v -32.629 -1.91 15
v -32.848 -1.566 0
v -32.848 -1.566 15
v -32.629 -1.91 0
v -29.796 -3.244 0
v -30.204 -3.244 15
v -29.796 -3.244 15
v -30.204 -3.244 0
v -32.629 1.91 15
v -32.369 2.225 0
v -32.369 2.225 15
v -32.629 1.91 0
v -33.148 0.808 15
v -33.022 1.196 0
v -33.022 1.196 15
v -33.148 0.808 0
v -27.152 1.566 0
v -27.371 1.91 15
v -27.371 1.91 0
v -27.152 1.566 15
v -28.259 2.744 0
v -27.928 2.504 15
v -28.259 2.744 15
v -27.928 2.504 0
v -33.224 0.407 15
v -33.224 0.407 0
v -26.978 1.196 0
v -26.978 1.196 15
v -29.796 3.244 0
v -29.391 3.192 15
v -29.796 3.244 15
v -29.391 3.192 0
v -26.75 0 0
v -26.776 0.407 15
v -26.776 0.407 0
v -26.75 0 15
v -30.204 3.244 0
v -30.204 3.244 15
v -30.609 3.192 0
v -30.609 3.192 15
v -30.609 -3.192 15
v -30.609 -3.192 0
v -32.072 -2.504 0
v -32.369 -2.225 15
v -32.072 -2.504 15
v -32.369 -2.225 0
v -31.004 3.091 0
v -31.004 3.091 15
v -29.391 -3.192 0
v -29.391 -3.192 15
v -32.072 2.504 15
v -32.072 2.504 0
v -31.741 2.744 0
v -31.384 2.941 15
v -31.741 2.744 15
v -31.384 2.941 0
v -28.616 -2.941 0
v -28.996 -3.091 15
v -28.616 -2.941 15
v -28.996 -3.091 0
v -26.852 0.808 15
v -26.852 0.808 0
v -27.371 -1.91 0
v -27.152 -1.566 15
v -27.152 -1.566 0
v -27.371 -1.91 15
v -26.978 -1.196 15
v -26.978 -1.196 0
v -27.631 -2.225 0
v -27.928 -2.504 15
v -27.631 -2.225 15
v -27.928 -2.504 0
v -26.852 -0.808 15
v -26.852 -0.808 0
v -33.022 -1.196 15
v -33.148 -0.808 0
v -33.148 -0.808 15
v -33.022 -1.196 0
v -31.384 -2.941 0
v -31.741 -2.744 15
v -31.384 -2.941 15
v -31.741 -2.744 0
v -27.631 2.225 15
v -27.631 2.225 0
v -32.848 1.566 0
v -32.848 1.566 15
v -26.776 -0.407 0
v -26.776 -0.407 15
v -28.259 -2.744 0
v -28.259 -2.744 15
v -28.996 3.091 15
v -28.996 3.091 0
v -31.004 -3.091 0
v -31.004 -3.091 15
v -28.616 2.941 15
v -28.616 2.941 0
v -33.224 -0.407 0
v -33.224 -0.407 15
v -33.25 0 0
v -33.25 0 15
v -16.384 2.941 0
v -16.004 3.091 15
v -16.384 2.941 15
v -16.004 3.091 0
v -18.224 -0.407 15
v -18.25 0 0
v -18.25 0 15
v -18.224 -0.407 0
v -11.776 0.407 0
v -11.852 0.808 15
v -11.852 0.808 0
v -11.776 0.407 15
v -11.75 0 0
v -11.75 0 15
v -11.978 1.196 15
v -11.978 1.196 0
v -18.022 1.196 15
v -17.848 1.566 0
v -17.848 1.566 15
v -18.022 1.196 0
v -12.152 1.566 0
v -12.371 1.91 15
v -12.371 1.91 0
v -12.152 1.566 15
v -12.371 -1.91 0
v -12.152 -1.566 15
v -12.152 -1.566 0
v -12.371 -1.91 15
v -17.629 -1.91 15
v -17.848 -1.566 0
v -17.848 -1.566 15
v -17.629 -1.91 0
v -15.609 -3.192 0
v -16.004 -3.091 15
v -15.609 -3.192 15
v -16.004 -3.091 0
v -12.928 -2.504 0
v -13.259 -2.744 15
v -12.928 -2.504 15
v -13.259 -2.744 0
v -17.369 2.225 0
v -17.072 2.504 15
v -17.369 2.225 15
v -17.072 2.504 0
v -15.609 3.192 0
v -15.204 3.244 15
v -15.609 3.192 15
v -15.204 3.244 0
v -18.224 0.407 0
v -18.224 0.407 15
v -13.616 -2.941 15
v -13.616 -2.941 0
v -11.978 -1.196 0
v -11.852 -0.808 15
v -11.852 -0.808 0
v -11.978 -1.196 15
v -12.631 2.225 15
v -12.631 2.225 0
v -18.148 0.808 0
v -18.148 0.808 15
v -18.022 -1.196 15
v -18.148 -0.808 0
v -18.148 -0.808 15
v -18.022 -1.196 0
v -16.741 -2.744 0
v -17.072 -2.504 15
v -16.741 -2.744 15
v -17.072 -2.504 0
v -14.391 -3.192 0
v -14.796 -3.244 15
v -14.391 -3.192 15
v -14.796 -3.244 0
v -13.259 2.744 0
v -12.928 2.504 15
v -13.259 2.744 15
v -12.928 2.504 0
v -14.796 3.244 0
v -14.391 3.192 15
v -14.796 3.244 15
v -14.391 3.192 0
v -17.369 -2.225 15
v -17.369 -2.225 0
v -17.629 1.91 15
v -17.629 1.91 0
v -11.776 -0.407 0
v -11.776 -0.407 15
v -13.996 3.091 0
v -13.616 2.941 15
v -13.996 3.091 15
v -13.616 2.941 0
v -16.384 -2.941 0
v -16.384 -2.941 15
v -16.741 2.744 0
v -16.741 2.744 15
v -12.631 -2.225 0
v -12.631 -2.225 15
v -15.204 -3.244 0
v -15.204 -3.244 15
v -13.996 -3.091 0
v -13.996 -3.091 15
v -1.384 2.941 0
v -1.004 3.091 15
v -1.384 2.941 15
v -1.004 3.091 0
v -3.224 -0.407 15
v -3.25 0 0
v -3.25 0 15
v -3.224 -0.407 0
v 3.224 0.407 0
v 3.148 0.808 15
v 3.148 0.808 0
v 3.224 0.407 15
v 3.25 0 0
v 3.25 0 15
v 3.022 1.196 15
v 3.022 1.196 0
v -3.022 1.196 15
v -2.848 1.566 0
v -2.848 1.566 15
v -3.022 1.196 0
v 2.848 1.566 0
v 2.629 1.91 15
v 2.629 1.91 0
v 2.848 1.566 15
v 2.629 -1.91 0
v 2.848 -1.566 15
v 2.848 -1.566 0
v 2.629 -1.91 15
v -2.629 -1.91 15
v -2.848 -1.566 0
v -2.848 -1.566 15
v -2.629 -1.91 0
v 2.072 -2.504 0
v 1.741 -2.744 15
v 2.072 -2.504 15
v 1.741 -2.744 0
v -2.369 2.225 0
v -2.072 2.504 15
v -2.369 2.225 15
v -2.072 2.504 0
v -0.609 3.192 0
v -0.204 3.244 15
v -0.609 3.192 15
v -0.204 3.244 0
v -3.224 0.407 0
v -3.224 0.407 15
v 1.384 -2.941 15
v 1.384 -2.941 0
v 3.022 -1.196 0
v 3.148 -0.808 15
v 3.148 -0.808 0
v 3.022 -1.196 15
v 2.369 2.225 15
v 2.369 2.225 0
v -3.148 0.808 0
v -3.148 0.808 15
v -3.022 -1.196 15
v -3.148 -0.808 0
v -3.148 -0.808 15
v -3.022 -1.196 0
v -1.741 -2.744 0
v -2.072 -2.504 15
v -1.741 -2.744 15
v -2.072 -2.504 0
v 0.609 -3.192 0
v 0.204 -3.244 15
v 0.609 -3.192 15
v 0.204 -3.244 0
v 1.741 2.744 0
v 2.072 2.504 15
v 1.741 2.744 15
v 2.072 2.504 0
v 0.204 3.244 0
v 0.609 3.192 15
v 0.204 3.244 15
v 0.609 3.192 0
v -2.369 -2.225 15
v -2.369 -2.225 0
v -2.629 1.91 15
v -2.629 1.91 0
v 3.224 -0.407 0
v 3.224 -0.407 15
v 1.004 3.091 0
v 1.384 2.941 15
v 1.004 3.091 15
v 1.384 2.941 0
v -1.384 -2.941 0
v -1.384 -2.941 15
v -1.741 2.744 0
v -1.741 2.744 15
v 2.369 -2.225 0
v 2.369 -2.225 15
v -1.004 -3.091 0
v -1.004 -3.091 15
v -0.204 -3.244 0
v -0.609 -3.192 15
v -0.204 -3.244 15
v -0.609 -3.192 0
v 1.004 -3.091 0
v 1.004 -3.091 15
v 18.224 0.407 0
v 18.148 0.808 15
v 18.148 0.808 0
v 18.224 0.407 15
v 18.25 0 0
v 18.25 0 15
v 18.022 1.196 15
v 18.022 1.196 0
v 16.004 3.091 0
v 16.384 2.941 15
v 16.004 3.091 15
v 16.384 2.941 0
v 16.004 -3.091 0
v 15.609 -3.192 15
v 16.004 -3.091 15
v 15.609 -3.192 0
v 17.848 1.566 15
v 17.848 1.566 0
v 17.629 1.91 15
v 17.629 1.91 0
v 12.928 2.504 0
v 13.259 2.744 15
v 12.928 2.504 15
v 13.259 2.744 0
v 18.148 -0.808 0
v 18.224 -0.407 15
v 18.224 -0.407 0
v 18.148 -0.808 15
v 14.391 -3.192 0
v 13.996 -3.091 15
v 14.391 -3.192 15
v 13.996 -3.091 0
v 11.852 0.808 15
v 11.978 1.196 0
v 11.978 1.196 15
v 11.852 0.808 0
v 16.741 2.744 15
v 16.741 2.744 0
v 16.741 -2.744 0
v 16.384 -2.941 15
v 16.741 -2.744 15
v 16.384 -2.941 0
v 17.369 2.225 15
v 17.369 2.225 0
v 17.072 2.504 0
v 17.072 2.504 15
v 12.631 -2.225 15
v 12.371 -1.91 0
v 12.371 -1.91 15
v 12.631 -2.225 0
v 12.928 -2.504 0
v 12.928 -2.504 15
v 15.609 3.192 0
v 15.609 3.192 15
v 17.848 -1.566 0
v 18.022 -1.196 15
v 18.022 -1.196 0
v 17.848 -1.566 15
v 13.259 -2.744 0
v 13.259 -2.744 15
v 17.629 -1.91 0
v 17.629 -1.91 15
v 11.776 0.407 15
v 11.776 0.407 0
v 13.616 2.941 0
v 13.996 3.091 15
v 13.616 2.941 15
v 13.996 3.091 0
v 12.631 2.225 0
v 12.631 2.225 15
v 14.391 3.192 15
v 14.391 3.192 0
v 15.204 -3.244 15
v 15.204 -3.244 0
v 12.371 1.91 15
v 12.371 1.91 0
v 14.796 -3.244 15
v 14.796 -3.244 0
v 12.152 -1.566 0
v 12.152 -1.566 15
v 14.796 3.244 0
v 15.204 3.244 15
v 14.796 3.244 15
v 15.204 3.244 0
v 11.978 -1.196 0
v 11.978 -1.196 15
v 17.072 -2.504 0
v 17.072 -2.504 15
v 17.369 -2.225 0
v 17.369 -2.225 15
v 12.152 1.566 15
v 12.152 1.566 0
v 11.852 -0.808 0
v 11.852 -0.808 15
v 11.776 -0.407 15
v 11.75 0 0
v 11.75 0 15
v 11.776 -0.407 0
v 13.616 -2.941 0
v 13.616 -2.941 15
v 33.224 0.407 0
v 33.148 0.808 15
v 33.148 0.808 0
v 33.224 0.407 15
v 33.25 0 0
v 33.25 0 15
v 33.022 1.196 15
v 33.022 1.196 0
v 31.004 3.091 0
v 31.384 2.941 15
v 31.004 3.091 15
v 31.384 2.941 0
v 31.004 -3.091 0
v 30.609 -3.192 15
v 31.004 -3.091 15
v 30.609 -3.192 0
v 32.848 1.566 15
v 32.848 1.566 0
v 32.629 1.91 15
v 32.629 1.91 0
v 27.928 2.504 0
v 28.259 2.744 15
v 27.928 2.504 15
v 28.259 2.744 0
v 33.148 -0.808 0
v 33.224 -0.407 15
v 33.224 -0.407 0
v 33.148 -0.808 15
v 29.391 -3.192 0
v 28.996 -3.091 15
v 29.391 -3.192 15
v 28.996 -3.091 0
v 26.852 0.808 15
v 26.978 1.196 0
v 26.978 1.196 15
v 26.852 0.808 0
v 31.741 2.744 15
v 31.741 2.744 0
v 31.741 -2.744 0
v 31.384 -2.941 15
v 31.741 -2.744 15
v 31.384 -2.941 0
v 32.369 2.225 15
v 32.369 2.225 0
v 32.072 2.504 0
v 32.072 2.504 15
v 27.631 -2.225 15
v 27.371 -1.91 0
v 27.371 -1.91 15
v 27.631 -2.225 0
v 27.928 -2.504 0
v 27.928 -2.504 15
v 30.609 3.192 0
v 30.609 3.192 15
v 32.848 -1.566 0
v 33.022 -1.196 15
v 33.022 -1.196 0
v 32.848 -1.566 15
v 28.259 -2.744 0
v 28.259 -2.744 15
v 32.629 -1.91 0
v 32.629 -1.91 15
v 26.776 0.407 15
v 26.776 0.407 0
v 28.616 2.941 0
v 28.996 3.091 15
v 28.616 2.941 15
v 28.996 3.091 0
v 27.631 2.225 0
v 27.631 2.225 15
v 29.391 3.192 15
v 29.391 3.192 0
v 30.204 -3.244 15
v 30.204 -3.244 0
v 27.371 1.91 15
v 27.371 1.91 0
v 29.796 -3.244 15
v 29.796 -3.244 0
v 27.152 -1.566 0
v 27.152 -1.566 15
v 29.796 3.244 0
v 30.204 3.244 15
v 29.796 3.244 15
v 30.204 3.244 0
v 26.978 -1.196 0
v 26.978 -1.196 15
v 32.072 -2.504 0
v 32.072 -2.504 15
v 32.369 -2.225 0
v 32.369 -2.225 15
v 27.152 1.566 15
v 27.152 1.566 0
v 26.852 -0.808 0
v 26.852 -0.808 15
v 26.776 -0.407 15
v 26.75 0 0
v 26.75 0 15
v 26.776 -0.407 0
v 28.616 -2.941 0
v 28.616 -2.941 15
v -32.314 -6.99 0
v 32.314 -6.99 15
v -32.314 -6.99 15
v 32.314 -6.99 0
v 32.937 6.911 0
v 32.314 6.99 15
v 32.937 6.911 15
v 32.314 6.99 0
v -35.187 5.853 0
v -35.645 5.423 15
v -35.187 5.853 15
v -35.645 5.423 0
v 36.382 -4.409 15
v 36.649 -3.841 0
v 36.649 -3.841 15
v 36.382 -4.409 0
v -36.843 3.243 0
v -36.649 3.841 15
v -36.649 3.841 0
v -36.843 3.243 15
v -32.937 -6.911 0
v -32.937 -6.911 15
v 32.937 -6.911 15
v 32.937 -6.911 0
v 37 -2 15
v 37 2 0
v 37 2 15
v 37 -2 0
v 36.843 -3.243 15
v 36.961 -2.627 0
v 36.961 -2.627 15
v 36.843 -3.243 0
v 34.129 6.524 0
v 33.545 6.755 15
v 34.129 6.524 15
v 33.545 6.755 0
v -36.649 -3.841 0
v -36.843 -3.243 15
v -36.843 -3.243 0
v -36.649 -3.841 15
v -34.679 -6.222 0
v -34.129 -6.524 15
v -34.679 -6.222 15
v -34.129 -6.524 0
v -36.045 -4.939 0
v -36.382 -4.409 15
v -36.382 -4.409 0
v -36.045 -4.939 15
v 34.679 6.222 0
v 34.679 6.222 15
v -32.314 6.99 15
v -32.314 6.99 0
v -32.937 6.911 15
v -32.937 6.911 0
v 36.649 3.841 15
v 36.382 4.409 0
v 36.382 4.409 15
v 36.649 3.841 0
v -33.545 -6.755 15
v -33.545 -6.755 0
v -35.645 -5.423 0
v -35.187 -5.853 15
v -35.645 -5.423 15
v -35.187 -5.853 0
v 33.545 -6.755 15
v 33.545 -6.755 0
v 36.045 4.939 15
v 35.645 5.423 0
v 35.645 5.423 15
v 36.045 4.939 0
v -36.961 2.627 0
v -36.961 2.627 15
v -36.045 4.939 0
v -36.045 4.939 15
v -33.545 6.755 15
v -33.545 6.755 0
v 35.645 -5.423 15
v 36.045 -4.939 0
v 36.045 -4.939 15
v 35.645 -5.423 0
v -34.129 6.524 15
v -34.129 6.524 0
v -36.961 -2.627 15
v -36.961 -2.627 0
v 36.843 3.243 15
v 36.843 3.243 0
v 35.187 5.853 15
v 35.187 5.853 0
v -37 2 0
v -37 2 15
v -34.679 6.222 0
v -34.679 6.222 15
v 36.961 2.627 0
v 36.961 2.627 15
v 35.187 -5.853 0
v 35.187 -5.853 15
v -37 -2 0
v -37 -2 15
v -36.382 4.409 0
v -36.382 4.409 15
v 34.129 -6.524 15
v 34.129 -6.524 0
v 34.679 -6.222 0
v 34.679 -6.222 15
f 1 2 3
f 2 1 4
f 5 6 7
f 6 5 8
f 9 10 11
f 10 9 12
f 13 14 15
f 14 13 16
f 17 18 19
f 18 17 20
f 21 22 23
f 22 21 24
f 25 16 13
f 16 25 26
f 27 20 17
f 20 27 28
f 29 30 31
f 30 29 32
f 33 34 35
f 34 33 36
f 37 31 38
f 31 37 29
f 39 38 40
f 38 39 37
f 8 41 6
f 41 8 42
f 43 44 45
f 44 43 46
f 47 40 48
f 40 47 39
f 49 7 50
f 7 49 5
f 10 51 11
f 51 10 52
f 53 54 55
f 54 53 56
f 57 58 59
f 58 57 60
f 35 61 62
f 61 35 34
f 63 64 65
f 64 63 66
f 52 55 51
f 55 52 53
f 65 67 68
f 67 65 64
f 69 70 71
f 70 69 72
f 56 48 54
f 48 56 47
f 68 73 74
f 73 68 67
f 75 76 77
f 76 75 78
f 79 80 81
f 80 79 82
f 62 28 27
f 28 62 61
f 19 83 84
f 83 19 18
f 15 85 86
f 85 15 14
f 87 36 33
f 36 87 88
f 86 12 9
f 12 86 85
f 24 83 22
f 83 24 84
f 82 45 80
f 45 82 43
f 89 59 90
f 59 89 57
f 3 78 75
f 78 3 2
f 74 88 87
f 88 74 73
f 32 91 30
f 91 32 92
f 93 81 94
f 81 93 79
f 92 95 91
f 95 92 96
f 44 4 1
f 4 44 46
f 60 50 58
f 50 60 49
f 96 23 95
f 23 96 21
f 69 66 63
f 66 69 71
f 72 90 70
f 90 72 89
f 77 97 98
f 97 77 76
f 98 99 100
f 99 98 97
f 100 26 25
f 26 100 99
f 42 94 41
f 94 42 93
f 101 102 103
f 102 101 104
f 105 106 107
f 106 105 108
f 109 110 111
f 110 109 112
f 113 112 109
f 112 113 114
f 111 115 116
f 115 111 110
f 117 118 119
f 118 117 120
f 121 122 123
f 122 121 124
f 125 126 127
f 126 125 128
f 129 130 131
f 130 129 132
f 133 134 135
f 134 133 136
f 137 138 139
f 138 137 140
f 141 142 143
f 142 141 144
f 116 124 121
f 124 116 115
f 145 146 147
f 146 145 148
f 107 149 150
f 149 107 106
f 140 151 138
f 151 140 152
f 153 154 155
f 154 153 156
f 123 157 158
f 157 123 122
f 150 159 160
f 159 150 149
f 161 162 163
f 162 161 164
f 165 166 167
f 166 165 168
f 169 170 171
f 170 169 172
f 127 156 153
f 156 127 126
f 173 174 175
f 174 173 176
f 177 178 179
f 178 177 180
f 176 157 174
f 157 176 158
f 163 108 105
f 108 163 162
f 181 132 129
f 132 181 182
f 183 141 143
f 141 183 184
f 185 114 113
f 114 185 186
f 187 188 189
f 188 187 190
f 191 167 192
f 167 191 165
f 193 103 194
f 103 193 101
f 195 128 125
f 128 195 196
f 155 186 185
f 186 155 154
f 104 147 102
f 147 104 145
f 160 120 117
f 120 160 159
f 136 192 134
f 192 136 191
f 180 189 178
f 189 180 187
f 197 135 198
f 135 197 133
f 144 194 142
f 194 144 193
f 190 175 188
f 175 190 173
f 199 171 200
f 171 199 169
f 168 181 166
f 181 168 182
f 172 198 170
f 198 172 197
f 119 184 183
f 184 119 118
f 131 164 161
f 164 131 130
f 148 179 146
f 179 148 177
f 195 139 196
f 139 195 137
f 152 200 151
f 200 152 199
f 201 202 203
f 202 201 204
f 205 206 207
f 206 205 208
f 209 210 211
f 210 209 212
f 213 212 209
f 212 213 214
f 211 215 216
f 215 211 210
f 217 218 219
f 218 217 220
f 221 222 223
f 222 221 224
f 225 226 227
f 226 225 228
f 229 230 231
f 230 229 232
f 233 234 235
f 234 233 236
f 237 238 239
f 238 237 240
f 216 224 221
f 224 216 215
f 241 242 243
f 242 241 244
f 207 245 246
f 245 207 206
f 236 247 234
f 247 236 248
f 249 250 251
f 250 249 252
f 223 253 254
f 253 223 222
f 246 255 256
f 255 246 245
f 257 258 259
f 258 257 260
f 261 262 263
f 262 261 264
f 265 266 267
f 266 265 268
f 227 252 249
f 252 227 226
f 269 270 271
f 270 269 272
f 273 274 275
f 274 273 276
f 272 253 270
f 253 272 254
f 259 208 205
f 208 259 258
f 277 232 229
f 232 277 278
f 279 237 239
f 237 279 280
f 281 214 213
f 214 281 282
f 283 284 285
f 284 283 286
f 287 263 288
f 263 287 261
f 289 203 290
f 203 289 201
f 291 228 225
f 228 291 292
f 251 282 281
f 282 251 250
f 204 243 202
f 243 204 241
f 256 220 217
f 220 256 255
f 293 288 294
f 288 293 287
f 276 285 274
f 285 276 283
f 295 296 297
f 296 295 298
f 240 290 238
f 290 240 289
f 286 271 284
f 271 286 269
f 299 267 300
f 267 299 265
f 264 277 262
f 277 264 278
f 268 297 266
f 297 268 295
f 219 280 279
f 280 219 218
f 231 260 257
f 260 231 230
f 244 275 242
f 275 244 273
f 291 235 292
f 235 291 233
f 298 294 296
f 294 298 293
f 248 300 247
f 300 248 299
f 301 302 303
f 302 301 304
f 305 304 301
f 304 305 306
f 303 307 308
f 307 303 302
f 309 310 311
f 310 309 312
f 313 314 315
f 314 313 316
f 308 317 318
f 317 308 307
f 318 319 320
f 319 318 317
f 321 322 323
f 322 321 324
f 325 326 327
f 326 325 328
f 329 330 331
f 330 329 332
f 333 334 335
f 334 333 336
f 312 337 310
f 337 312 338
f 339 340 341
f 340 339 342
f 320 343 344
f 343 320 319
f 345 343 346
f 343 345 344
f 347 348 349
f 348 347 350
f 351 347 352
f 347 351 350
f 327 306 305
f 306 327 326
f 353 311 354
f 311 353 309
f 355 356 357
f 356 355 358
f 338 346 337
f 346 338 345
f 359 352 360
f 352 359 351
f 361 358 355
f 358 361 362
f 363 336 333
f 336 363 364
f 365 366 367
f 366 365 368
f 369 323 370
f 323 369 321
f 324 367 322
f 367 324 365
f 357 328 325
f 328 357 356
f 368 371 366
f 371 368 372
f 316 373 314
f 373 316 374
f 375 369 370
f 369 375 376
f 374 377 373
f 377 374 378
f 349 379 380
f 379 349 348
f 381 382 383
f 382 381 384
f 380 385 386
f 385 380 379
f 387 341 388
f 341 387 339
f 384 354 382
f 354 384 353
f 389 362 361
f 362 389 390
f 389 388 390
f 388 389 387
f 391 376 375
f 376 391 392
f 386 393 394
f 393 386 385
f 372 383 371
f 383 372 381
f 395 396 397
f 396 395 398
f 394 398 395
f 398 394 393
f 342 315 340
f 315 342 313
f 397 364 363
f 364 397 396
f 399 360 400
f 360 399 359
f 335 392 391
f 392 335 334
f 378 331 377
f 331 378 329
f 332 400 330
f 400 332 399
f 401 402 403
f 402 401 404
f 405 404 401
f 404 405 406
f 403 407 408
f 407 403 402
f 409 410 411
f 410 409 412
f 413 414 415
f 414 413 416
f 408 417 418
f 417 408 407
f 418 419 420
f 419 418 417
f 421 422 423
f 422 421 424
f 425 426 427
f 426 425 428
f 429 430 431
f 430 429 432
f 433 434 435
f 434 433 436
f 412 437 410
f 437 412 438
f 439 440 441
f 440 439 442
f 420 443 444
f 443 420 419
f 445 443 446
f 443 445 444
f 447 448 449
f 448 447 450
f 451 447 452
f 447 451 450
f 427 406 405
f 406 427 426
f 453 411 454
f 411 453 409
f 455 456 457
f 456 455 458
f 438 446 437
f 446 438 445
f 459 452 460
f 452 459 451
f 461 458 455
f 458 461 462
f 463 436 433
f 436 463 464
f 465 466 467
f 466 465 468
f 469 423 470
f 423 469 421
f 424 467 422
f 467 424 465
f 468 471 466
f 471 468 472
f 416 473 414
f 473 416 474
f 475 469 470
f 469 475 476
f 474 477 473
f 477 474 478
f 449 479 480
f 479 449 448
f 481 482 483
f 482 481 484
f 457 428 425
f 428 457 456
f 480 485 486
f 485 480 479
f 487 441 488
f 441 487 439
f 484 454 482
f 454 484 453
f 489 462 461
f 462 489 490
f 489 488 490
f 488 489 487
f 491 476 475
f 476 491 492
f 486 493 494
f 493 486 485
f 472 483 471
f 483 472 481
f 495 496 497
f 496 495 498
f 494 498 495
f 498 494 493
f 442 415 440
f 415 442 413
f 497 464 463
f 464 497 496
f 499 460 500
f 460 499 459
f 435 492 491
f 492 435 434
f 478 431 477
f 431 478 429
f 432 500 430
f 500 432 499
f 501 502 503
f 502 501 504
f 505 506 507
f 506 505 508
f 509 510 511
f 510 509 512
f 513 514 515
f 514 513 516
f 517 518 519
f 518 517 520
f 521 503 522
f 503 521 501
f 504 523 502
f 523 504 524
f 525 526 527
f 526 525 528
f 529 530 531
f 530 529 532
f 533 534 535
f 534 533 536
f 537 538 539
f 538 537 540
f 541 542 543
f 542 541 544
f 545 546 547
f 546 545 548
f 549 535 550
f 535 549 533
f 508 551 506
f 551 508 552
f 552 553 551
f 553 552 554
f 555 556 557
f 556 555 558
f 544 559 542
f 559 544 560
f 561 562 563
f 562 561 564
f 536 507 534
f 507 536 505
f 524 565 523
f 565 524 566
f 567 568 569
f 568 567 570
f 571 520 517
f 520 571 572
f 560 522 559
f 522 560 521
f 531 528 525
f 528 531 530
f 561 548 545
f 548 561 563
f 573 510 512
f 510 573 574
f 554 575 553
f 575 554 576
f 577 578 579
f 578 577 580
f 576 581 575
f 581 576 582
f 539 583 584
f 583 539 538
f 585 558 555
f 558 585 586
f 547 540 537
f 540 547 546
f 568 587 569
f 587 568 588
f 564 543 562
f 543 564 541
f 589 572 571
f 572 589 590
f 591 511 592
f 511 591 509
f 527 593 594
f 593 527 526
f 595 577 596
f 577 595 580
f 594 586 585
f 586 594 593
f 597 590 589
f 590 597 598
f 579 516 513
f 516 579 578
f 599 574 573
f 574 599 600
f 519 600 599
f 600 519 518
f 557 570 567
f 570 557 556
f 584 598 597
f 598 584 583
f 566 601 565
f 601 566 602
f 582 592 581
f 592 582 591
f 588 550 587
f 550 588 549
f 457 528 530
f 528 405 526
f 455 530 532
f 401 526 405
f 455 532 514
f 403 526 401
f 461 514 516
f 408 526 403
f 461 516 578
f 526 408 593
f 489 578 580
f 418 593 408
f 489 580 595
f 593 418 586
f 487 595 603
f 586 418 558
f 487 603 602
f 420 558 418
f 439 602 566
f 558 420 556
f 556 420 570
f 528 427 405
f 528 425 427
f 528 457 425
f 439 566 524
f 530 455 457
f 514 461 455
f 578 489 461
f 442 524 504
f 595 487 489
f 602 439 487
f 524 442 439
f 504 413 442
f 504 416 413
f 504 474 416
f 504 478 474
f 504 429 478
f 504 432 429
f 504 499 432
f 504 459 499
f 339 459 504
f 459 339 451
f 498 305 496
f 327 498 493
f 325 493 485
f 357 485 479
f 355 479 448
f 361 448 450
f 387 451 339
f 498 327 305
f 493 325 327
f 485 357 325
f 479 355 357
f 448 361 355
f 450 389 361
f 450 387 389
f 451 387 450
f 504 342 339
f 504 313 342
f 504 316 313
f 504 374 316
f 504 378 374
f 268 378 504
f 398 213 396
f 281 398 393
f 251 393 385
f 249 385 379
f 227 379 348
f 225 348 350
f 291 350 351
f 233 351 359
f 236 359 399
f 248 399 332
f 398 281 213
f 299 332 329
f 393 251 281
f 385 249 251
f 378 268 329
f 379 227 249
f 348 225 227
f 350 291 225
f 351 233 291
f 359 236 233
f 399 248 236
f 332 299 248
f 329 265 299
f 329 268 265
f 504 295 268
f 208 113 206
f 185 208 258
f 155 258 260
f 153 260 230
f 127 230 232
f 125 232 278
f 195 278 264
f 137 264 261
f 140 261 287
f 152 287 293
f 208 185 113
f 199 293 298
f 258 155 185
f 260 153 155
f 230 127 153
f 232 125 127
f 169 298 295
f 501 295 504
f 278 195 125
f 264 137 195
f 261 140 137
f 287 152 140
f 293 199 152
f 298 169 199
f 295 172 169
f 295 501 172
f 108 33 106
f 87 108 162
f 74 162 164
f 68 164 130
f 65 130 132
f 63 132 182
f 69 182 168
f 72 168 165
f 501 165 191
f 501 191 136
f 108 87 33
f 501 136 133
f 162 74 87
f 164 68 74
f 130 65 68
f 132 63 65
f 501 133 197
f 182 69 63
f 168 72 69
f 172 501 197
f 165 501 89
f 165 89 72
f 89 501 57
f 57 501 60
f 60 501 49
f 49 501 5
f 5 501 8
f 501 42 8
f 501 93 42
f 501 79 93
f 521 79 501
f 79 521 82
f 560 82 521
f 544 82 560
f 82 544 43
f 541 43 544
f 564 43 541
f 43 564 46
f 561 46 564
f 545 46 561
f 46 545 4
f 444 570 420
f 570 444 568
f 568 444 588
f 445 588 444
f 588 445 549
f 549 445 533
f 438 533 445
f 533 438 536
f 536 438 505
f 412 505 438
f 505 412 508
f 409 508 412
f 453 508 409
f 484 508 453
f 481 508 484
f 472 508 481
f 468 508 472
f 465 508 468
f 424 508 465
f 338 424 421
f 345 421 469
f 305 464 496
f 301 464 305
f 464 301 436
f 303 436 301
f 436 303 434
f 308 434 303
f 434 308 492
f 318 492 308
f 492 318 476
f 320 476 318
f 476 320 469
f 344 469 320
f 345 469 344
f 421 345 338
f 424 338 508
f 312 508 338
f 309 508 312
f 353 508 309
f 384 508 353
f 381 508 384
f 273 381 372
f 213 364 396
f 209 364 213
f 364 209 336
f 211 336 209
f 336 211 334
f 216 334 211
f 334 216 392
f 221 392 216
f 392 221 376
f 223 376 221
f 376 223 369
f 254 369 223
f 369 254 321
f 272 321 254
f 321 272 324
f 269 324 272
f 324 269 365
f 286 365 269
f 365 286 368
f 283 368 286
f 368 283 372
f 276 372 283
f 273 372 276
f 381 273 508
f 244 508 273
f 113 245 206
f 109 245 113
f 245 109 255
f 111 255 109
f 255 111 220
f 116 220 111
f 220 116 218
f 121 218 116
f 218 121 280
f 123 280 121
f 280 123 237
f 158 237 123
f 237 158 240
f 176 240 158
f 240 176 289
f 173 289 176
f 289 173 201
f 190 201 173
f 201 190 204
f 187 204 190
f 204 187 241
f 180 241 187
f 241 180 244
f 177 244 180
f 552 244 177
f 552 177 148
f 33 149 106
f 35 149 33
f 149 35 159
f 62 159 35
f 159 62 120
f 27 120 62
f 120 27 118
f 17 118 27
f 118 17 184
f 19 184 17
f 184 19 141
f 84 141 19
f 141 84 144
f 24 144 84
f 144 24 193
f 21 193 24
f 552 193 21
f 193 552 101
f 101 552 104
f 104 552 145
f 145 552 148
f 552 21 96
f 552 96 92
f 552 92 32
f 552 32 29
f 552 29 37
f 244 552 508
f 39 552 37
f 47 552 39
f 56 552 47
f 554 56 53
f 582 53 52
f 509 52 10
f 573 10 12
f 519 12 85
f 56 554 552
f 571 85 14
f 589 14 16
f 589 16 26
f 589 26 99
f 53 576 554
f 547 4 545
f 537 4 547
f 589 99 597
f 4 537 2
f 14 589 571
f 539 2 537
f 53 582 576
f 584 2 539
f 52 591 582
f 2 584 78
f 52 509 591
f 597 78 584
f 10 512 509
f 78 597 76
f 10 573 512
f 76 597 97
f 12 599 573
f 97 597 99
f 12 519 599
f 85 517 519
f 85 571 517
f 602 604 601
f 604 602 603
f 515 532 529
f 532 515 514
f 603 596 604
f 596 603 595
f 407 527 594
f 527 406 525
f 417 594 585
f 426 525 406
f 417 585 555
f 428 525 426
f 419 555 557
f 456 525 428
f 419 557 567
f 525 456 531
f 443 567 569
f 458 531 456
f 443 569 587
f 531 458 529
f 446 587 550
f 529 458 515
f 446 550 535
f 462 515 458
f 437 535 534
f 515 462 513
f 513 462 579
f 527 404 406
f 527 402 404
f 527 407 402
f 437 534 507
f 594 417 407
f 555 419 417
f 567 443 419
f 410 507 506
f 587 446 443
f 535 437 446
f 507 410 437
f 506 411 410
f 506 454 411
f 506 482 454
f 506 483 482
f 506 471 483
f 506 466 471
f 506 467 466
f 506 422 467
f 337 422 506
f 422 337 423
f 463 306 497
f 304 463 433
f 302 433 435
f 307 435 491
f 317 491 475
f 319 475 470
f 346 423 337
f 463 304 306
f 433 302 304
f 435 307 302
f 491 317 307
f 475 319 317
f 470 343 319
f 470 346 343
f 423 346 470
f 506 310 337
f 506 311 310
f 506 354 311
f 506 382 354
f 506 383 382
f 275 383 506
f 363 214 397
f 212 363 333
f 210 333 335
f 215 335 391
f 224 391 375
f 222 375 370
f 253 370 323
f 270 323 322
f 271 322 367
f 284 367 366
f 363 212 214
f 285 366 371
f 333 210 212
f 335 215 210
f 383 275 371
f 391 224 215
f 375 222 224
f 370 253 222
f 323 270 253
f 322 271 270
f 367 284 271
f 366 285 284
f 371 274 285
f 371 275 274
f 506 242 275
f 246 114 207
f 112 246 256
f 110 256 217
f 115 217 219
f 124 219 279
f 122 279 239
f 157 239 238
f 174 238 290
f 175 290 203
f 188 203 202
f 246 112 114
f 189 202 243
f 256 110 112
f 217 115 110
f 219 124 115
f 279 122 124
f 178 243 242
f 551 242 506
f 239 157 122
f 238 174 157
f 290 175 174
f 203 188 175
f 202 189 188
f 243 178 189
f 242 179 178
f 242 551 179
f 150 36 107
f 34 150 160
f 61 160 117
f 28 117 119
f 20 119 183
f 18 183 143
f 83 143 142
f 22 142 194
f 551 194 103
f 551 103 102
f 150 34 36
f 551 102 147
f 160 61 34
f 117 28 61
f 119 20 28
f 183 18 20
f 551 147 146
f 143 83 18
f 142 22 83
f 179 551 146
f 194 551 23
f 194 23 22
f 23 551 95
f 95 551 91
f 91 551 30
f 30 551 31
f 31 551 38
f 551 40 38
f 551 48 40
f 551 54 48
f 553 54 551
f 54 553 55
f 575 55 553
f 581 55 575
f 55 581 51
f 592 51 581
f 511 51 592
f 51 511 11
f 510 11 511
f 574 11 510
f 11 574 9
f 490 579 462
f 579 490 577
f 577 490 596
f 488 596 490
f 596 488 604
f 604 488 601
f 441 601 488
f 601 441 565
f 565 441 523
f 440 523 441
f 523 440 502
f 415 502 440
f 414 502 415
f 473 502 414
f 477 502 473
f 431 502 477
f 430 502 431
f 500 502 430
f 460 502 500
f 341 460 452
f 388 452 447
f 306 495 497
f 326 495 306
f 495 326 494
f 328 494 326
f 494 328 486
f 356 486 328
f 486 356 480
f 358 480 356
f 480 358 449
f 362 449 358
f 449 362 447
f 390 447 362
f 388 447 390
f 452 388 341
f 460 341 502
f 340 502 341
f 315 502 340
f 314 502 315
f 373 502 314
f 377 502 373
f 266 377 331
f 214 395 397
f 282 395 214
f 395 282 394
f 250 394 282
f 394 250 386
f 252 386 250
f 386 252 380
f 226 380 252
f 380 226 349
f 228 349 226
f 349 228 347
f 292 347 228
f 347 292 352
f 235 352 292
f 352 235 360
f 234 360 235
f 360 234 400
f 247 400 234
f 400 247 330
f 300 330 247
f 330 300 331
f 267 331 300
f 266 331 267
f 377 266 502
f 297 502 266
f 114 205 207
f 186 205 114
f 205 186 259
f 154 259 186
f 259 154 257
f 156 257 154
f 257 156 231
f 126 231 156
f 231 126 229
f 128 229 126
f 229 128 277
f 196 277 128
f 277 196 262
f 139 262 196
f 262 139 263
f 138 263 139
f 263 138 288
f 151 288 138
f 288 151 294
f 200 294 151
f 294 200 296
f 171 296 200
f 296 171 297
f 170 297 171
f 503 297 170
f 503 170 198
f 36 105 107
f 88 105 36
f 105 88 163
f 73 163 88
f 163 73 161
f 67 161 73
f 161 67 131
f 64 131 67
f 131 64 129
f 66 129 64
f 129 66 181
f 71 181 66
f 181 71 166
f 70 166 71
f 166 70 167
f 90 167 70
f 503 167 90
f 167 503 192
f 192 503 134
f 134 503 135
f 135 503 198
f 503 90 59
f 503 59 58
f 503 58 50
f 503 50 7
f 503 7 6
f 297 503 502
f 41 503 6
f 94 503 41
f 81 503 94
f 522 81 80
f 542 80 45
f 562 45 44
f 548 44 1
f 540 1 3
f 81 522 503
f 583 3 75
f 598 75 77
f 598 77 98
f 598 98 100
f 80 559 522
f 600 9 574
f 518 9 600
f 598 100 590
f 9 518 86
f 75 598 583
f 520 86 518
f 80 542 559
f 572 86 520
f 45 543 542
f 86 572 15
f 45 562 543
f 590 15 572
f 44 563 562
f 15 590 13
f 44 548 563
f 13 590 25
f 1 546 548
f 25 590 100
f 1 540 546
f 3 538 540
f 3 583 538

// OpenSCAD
$fn = 50;


difference() {
	union() {
		hull() {
			translate(v = [-32.0000000000, 2.0000000000, 0]) {
				cylinder(h = 15, r = 5);
			}
			translate(v = [32.0000000000, 2.0000000000, 0]) {
				cylinder(h = 15, r = 5);
			}
			translate(v = [-32.0000000000, -2.0000000000, 0]) {
				cylinder(h = 15, r = 5);
			}
			translate(v = [32.0000000000, -2.0000000000, 0]) {
				cylinder(h = 15, r = 5);
			}
		}
	}
	union() {
		translate(v = [-30.0000000000, 0.0000000000, -100.0000000000]) {
			cylinder(h = 200, r = 3.2500000000);
		}
		translate(v = [-15.0000000000, 0.0000000000, -100.0000000000]) {
			cylinder(h = 200, r = 3.2500000000);
		}
		translate(v = [0.0000000000, 0.0000000000, -100.0000000000]) {
			cylinder(h = 200, r = 3.2500000000);
		}
		translate(v = [15.0000000000, 0.0000000000, -100.0000000000]) {
			cylinder(h = 200, r = 3.2500000000);
		}
		translate(v = [30.0000000000, 0.0000000000, -100.0000000000]) {
			cylinder(h = 200, r = 3.2500000000);
		}
	}
}
